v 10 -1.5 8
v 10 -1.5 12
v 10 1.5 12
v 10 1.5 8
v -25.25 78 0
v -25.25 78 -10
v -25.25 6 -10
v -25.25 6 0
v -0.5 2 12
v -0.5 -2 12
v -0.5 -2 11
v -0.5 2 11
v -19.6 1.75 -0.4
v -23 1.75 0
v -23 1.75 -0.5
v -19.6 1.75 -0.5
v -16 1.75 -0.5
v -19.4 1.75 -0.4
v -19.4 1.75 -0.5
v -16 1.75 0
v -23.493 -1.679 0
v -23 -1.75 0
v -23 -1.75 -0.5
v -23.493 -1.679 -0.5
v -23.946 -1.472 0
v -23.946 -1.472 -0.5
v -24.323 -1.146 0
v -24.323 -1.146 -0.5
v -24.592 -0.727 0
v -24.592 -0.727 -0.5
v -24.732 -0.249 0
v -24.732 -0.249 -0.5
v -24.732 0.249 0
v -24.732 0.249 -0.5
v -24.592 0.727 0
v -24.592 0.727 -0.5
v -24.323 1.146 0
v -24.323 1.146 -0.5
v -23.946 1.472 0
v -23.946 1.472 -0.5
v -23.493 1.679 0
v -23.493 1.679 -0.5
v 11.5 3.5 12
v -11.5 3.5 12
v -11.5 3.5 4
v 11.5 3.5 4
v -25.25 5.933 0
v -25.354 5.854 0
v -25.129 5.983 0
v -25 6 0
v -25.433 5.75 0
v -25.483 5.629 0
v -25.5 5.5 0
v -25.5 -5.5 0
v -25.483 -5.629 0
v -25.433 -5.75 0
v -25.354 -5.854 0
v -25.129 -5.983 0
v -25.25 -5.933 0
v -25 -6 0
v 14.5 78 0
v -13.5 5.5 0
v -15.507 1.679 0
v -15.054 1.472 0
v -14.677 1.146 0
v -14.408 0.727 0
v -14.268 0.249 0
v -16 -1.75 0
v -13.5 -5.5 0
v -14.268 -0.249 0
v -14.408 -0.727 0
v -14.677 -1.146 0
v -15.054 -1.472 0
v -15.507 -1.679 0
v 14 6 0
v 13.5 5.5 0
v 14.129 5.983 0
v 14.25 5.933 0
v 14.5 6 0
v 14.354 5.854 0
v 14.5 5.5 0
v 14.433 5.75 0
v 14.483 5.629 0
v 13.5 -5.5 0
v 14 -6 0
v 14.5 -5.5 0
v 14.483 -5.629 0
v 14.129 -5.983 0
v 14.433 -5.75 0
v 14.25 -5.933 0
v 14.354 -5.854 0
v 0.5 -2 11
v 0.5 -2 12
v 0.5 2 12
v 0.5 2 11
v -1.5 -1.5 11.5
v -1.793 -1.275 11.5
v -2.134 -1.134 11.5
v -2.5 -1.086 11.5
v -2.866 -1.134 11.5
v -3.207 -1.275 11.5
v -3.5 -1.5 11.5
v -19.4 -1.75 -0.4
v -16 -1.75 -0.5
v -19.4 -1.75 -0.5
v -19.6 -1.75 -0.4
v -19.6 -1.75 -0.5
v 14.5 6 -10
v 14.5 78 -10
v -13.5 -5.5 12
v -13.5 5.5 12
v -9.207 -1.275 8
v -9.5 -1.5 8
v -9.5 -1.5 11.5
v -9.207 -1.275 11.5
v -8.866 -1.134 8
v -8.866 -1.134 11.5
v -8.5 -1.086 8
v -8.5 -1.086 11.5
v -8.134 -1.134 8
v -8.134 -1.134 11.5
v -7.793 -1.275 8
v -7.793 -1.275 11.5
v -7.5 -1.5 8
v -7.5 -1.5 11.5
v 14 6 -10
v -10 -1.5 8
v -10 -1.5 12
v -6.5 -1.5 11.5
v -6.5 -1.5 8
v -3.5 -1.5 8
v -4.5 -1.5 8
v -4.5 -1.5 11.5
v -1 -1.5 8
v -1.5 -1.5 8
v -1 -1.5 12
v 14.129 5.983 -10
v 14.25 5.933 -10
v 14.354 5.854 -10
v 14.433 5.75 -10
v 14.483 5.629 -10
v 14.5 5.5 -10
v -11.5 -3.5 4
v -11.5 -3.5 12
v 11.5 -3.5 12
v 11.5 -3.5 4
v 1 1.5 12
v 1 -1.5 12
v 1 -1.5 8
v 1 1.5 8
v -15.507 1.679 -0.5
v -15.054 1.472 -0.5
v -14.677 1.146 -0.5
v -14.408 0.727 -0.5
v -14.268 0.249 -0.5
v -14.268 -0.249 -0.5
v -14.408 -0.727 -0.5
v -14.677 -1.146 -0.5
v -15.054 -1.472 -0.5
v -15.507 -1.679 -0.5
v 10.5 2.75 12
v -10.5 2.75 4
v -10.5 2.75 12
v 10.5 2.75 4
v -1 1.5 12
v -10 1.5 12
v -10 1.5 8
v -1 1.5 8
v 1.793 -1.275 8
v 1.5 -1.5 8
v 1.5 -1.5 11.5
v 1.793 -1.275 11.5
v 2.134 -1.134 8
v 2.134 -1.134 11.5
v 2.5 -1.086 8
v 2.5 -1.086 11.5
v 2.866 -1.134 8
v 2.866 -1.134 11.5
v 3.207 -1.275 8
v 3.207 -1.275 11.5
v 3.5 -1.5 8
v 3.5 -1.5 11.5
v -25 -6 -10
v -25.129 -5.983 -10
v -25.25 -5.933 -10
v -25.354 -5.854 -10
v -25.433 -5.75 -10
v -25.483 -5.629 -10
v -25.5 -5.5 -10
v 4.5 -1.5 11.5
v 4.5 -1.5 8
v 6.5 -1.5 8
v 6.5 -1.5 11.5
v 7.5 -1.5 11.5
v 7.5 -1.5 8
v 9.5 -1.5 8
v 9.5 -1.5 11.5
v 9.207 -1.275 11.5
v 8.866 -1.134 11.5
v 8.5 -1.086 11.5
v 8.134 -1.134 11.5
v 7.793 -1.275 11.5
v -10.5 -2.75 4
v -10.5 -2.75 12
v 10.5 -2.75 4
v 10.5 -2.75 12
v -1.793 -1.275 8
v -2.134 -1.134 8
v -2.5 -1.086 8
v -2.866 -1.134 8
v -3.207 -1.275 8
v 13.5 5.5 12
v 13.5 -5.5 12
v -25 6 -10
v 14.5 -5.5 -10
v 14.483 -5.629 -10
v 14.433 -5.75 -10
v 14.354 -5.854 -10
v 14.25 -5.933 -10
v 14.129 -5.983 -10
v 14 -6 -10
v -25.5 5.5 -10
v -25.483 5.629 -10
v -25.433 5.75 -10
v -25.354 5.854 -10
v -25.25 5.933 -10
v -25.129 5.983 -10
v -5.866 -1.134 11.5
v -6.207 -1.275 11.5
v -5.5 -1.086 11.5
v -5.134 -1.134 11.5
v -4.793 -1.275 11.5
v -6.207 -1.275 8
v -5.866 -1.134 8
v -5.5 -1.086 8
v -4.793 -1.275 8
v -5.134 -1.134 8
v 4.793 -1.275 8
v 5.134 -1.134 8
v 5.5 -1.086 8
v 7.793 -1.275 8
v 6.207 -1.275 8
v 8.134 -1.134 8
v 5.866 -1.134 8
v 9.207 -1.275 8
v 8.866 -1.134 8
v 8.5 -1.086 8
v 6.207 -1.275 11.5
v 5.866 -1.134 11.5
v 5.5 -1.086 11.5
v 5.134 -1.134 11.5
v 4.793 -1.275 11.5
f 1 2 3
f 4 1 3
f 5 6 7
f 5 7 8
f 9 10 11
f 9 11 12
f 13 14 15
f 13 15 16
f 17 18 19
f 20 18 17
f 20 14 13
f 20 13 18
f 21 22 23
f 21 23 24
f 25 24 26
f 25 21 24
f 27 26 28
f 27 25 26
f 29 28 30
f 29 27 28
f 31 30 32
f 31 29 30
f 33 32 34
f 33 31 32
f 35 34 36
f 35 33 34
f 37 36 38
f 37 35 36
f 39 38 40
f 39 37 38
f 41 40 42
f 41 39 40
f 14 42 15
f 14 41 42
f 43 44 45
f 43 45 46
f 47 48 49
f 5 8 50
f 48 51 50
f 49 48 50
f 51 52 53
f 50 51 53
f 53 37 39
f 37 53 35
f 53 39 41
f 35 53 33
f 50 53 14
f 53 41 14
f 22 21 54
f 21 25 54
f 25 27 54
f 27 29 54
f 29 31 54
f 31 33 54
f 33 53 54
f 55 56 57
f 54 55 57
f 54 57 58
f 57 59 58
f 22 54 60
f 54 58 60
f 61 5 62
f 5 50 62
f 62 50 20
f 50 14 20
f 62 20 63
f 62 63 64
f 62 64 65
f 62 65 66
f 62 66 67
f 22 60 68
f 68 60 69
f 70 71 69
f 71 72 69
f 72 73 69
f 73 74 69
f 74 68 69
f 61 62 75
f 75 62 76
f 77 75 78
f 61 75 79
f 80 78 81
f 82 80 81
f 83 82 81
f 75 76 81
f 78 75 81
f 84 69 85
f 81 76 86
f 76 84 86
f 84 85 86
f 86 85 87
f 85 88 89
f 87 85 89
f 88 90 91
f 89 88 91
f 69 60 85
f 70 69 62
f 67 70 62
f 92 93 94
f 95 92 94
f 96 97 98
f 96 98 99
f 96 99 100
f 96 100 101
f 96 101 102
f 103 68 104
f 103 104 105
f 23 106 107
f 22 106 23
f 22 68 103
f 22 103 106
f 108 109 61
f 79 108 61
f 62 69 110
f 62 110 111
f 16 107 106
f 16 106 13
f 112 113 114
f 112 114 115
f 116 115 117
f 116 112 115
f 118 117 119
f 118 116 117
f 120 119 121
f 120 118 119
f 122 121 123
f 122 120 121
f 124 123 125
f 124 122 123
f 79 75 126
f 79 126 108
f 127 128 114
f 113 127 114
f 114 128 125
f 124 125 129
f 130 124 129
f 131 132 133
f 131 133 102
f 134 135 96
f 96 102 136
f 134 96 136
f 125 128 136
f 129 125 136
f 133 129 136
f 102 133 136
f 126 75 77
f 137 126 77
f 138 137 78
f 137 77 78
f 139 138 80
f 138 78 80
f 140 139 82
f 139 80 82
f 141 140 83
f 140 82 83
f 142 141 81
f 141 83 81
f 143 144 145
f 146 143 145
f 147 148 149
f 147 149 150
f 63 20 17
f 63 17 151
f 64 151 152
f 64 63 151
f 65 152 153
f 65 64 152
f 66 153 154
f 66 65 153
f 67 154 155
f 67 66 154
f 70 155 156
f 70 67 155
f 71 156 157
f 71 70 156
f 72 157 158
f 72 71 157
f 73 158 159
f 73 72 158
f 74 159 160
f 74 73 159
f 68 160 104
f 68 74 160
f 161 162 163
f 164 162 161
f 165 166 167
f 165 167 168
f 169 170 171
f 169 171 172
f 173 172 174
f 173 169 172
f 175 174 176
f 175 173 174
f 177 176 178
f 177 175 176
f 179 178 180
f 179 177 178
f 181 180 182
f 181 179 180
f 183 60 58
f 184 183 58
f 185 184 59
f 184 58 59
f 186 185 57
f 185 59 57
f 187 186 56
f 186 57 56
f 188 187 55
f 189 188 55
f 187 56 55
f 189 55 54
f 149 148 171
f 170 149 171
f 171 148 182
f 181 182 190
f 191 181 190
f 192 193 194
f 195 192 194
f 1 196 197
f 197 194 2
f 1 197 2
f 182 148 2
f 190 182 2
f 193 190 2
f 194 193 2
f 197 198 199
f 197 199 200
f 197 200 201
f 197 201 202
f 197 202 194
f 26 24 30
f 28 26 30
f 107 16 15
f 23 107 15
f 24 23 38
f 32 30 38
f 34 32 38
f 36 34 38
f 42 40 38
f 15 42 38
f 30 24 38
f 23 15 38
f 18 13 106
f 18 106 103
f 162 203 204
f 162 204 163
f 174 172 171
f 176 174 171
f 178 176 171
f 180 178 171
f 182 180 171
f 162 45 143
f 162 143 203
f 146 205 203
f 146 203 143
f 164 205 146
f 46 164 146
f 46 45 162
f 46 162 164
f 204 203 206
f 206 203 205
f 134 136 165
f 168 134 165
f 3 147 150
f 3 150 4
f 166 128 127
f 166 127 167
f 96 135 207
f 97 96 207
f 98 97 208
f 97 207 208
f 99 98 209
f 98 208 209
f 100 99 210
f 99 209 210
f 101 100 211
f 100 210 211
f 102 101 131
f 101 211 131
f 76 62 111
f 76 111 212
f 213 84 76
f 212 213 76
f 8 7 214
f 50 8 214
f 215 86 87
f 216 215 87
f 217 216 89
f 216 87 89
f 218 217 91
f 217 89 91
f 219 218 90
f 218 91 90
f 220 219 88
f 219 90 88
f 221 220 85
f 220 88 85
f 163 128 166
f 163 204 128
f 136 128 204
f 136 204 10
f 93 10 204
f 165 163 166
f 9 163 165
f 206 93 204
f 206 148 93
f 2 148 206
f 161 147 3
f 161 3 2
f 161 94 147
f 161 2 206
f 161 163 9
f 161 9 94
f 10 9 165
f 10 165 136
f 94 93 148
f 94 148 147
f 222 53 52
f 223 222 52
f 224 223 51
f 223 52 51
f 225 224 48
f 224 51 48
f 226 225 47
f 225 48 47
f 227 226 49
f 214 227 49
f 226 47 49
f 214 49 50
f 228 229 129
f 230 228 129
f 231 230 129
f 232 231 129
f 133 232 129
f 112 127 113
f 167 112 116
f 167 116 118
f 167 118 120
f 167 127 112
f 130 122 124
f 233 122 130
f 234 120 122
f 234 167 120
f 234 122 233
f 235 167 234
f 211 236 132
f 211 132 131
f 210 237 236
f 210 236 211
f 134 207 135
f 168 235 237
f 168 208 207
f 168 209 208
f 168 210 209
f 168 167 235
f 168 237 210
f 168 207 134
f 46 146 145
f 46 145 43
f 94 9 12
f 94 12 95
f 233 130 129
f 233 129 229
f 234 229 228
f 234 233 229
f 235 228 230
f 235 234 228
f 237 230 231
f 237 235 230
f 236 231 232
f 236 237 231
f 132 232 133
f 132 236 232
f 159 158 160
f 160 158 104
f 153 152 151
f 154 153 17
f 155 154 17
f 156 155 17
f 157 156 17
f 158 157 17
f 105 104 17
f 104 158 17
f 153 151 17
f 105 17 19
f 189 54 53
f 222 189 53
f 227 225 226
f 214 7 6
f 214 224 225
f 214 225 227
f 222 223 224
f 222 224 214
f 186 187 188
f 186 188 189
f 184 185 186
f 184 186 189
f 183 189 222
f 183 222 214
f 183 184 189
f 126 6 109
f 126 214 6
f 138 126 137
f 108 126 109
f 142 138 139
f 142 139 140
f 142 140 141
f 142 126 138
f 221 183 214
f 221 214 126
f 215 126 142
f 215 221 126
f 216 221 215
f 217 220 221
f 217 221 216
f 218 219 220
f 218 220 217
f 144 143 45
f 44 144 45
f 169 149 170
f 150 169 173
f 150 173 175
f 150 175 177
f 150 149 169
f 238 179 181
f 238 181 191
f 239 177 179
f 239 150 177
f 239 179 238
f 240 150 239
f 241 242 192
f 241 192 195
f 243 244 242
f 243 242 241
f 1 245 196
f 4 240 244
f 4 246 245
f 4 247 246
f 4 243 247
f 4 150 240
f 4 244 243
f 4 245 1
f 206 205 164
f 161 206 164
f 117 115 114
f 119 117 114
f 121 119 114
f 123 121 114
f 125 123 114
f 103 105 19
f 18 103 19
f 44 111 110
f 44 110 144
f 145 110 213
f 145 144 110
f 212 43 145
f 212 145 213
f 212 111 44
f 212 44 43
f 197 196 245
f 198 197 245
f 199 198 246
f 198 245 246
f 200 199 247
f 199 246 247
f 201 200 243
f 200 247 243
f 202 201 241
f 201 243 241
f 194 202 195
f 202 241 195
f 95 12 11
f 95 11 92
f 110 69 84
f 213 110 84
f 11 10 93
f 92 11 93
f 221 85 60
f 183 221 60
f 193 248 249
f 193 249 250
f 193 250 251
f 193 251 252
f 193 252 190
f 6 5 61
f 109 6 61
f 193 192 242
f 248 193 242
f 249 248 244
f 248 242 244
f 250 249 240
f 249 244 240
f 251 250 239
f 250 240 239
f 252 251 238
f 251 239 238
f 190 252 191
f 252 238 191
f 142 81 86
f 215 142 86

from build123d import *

# Parameters (mm, degrees)
SKETCH_1_W          = 27
SKETCH_1_H          = 11
EXTRUDE_1_DEPTH     = 12
SKETCH_2_W          = 23
SKETCH_2_H          = 7
CUT_EXTRUDE_1_DEPTH = 8
SKETCH_3_W          = 21
SKETCH_3_H          = 5.5
EXTRUDE_2_DEPTH     = 8
SKETCH_4_W          = 9
SKETCH_4_H          = 3
CUT_EXTRUDE_2_DEPTH = 4
SKETCH_5_W          = 1
SKETCH_5_H          = 4
CUT_EXTRUDE_3_DEPTH = 1
EXTRUDE_3_DEPTH     = 3.5
EXTRUDE_4_DEPTH     = 10
CUT_EXTRUDE_4_DEPTH = 0.5
SKETCH_9_W          = 0.2
SKETCH_9_H          = 3.5
EXTRUDE_5_DEPTH     = 0.1
SKETCH_10_W         = 39.75
SKETCH_10_H         = 10
EXTRUDE_6_DEPTH     = 72


with BuildPart() as part:
    # 草图1 → 凸台-拉伸1 (new body)
    with BuildSketch(Plane.XY):
        Rectangle(SKETCH_1_W, SKETCH_1_H)
    extrude(amount=EXTRUDE_1_DEPTH)

    # 草图2 → 切除-拉伸1 (cut)
    with BuildSketch(Plane.XY.offset(12)):
        Rectangle(SKETCH_2_W, SKETCH_2_H)
    extrude(amount=-CUT_EXTRUDE_1_DEPTH, mode=Mode.SUBTRACT)

    # 草图3 → 凸台-拉伸2 (add)
    with BuildSketch(Plane.XY.offset(4)):
        Rectangle(SKETCH_3_W, SKETCH_3_H)
    extrude(amount=EXTRUDE_2_DEPTH)

    # 草图4 → 切除-拉伸2 (cut)
    with BuildSketch(Plane.XY.offset(12)):
        with Locations((5.5, 0)):
            Rectangle(SKETCH_4_W, SKETCH_4_H)
        with Locations((-5.5, 0)):
            Rectangle(SKETCH_4_W, SKETCH_4_H)
    extrude(amount=-CUT_EXTRUDE_2_DEPTH, mode=Mode.SUBTRACT)

    # 草图5 → 切除-拉伸3 (cut)
    with BuildSketch(Plane.XY.offset(12)):
        Rectangle(SKETCH_5_W, SKETCH_5_H)
    extrude(amount=-CUT_EXTRUDE_3_DEPTH, mode=Mode.SUBTRACT)

    # 草图6 → 凸台-拉伸3 (add)
    with BuildSketch(Plane.XY.offset(8)):
        with BuildLine():
            Line((-7.5, -1.5), (-9.5, -1.5))
            ThreePointArc((-9.5, -1.5), (-8.5, -1.085786438), (-7.5, -1.5))
        make_face()
        with BuildLine():
            Line((-4.5, -1.5), (-6.5, -1.5))
            ThreePointArc((-6.5, -1.5), (-5.5, -1.085786438), (-4.5, -1.5))
        make_face()
        with BuildLine():
            Line((-3.5, -1.5), (-1.5, -1.5))
            ThreePointArc((-1.5, -1.5), (-2.5, -1.085786438), (-3.5, -1.5))
        make_face()
        with BuildLine():
            Line((3.5, -1.5), (1.5, -1.5))
            ThreePointArc((1.5, -1.5), (2.5, -1.085786438), (3.5, -1.5))
        make_face()
        with BuildLine():
            Line((4.5, -1.5), (6.5, -1.5))
            ThreePointArc((6.5, -1.5), (5.5, -1.085786438), (4.5, -1.5))
        make_face()
        with BuildLine():
            Line((7.5, -1.5), (9.5, -1.5))
            ThreePointArc((9.5, -1.5), (8.5, -1.085786438), (7.5, -1.5))
        make_face()
    extrude(amount=EXTRUDE_3_DEPTH)

    # 草图7 → 凸台-拉伸4 (add)
    with BuildSketch(Plane(origin=(0, 0, 0), x_dir=(-1, 0, 0), z_dir=(0, 0, -1))):
        with BuildLine():
            Line((-14, -6), (25, -6))
            ThreePointArc((25, -6), (25.353553391, -5.853553391), (25.5, -5.5))
            Line((25.5, -5.5), (25.5, 5.5))
            ThreePointArc((25.5, 5.5), (25.353553391, 5.853553391), (25, 6))
            Line((25, 6), (-14, 6))
            ThreePointArc((-14, 6), (-14.353553391, 5.853553391), (-14.5, 5.5))
            Line((-14.5, 5.5), (-14.5, -5.5))
            ThreePointArc((-14.5, -5.5), (-14.353553391, -5.853553391), (-14, -6))
        make_face()
    extrude(amount=EXTRUDE_4_DEPTH)

    # 草图8 → 切除-拉伸4 (cut)
    with BuildSketch(Plane.XY):
        with BuildLine():
            Line((-23, 1.75), (-16, 1.75))
            ThreePointArc((-16, 1.75), (-14.25, 0), (-16, -1.75))
            Line((-16, -1.75), (-23, -1.75))
            ThreePointArc((-23, -1.75), (-24.75, 0), (-23, 1.75))
        make_face()
    extrude(amount=-CUT_EXTRUDE_4_DEPTH, mode=Mode.SUBTRACT)

    # 草图9 → 凸台-拉伸5 (add)
    with BuildSketch(Plane.XY.offset(-0.5)):
        with Locations((-19.5, 0)):
            Rectangle(SKETCH_9_W, SKETCH_9_H)
    extrude(amount=EXTRUDE_5_DEPTH)

    # 草图10 → 凸台-拉伸6 (add)
    with BuildSketch(Plane.XZ.offset(-6)):
        with Locations((-5.375, -5)):
            Rectangle(SKETCH_10_W, SKETCH_10_H)
    extrude(amount=-EXTRUDE_6_DEPTH)


solid = part.part
